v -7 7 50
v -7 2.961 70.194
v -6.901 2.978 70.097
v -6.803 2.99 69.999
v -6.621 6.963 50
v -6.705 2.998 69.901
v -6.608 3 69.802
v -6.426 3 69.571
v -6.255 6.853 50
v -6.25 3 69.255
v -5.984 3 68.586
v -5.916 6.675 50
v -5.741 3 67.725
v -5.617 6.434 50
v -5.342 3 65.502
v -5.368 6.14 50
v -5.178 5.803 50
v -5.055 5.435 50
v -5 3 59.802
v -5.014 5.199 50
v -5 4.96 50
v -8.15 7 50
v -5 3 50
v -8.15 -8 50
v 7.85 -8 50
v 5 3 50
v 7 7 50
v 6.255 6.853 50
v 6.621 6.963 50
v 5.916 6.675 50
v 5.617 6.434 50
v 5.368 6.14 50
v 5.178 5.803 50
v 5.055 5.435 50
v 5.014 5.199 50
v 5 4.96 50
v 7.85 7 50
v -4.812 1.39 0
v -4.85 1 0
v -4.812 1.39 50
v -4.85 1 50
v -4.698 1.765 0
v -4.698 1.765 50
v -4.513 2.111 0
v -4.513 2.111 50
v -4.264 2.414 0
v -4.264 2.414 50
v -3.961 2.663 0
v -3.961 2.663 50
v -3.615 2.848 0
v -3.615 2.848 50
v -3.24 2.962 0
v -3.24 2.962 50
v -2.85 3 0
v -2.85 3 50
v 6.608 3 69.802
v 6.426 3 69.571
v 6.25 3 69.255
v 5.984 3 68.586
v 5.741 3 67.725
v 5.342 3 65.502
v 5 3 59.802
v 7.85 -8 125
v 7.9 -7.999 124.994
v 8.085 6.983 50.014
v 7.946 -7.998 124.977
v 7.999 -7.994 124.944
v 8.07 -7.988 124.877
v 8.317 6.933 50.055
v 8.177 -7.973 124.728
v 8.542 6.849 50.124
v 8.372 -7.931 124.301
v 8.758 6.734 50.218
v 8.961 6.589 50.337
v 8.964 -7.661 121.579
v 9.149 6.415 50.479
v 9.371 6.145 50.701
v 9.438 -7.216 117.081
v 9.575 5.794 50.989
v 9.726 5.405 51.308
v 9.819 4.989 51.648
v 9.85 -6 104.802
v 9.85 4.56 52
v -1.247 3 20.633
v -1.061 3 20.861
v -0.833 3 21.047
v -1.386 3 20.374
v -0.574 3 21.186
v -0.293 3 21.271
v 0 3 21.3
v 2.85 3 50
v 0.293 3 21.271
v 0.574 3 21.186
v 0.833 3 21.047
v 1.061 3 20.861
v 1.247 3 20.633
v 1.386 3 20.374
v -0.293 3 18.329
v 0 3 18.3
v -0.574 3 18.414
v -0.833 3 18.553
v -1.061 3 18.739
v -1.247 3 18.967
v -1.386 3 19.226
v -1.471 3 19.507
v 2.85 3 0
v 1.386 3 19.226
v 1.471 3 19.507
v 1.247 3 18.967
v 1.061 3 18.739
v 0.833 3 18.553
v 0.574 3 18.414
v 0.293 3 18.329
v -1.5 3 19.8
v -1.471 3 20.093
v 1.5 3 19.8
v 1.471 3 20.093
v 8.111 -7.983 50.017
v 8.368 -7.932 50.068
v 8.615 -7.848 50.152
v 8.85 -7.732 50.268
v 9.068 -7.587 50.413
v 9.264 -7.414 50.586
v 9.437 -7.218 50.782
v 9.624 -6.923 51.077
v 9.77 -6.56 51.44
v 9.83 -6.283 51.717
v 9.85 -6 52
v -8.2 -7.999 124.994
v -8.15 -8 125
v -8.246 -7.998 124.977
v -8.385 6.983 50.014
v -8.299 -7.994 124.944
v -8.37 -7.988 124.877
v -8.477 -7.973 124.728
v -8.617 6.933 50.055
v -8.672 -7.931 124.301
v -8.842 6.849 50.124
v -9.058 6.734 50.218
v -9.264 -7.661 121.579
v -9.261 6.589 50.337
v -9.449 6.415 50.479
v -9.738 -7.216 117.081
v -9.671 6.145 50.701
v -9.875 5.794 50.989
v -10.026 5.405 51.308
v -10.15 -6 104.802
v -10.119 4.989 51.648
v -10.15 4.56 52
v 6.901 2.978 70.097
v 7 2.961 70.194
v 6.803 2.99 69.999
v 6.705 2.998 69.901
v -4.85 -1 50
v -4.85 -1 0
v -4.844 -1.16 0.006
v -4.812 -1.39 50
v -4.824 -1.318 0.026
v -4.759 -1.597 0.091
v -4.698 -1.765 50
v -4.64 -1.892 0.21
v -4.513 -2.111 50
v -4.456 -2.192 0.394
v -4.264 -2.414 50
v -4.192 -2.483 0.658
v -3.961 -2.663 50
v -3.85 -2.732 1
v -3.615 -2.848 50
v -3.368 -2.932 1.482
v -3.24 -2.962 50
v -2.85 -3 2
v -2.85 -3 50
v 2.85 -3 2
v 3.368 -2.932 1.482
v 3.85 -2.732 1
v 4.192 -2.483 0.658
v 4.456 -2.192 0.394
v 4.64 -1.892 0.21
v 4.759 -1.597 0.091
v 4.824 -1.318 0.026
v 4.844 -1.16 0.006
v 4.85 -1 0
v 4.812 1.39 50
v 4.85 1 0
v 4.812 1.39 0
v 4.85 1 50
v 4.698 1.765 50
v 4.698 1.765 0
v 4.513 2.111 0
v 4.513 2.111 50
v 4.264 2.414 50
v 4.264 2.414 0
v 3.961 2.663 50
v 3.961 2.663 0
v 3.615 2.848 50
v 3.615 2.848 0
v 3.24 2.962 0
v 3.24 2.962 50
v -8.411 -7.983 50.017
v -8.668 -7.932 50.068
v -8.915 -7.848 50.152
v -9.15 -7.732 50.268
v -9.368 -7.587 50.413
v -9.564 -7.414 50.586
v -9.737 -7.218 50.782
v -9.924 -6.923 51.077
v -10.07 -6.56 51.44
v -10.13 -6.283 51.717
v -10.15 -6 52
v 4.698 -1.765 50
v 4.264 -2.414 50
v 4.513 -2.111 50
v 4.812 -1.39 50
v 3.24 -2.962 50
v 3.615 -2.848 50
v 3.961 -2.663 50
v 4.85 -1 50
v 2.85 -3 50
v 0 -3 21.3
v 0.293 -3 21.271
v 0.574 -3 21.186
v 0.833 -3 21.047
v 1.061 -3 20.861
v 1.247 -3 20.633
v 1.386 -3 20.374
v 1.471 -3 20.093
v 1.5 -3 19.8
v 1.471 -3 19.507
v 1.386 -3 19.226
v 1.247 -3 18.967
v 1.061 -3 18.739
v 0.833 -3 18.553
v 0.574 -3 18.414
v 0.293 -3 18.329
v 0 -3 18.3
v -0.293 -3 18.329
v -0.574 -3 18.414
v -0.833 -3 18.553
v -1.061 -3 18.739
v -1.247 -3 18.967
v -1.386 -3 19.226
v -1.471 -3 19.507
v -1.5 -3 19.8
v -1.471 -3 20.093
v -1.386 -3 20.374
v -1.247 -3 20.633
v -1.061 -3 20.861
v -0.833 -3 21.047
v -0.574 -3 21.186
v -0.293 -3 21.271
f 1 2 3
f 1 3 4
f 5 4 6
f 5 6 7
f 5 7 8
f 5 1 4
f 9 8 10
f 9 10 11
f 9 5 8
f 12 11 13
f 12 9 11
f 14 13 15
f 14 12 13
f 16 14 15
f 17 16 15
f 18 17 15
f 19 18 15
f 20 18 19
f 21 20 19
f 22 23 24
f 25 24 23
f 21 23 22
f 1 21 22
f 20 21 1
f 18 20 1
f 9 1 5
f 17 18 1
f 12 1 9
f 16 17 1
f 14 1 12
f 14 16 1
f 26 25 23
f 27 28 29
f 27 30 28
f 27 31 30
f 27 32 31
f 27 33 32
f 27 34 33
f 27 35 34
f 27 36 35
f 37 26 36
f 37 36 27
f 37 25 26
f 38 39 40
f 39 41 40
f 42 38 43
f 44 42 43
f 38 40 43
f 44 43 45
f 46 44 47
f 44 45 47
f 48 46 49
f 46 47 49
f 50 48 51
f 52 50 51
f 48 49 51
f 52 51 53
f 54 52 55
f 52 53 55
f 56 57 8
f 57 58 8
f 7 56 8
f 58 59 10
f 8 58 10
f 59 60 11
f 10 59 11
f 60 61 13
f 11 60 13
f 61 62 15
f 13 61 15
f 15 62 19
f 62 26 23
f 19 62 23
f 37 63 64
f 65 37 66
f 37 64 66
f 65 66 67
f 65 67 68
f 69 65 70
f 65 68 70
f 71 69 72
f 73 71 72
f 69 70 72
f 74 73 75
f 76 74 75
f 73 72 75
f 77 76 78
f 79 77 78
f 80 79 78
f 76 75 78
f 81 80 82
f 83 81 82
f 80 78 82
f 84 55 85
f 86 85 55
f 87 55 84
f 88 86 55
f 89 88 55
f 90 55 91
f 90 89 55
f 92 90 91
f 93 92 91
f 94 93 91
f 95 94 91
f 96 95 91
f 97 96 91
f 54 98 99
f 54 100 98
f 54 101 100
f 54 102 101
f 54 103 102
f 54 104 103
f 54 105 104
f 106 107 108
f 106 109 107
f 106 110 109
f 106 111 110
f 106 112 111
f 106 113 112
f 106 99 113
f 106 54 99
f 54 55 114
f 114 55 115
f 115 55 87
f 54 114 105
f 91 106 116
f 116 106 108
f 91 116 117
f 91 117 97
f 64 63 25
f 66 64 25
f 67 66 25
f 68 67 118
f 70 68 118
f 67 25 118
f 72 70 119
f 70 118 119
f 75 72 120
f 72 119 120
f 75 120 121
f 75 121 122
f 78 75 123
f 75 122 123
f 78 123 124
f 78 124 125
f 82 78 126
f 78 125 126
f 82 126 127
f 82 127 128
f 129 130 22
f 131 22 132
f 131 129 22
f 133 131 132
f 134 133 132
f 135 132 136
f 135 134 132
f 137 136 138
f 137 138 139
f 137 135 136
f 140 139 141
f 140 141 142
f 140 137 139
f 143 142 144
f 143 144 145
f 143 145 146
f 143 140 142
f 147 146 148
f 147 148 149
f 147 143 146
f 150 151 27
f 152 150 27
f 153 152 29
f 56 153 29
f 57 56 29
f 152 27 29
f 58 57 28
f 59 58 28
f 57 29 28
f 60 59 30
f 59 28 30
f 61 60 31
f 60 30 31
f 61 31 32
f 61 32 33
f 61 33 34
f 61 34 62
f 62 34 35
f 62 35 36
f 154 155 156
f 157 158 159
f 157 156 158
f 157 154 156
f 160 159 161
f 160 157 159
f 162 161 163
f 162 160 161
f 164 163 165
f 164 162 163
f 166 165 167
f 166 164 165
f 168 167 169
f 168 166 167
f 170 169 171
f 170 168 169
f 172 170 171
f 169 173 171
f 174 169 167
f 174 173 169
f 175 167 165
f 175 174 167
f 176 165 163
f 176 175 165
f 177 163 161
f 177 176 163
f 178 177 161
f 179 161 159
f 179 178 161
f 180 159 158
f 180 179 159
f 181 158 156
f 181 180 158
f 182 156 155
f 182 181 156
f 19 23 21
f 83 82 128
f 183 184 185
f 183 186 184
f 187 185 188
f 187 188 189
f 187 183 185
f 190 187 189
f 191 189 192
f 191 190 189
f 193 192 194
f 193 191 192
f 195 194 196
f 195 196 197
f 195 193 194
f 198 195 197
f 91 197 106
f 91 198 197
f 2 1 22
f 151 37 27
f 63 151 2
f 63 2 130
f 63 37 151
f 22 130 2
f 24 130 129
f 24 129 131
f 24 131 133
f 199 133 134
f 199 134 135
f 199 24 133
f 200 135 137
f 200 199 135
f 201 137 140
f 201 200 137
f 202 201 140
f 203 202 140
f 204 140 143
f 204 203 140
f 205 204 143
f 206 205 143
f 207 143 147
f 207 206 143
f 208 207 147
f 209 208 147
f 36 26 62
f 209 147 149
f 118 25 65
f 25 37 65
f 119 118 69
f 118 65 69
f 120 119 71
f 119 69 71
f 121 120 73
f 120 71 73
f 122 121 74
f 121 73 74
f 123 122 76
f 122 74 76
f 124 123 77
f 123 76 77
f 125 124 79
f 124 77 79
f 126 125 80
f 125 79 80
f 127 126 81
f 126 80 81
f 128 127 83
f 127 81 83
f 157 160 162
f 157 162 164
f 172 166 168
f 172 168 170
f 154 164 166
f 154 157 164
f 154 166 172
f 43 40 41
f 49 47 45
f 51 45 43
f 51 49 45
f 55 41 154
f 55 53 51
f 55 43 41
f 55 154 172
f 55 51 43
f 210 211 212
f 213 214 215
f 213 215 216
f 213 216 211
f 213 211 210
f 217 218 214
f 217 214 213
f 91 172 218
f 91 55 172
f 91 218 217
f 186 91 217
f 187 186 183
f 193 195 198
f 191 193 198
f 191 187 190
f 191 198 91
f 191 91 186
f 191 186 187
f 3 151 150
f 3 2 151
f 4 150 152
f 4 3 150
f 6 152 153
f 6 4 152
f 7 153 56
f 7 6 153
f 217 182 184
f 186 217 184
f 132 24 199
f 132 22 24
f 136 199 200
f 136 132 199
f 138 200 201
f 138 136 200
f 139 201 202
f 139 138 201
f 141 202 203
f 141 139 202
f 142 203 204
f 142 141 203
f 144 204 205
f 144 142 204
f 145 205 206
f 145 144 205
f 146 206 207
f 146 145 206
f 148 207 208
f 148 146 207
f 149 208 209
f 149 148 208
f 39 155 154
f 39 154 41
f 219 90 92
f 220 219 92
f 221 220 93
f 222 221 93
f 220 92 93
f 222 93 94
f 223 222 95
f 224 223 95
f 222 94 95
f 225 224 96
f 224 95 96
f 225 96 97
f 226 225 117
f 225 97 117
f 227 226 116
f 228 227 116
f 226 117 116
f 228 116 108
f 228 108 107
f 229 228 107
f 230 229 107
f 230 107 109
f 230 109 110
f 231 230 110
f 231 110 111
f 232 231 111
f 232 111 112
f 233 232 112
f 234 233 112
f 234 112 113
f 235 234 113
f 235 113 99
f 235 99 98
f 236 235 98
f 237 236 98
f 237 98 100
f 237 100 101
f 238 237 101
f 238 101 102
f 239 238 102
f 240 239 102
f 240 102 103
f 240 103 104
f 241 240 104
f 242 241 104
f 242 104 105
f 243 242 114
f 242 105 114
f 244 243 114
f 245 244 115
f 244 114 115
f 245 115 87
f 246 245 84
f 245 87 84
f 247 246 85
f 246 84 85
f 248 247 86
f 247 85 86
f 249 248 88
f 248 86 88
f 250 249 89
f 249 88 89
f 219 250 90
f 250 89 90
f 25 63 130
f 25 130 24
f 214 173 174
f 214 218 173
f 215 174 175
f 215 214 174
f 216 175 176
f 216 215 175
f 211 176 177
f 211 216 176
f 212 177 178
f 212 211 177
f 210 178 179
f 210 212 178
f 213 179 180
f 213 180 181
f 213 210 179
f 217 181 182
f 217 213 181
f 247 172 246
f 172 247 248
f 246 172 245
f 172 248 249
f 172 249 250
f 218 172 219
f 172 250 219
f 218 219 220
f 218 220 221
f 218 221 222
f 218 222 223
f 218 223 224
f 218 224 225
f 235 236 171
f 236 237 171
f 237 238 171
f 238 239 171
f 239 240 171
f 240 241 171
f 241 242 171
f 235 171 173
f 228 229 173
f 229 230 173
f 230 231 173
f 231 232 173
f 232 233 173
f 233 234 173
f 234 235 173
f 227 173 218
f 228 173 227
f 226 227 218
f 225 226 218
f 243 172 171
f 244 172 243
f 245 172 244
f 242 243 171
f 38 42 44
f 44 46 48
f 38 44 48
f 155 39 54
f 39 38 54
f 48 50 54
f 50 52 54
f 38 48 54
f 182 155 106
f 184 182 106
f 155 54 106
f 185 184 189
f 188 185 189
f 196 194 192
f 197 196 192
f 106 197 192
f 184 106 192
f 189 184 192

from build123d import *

# Parameters (mm, degrees)
SKETCH1_W           = 9.7
SKETCH1_H           = 6
BOSS_EXTRUDE3_DEPTH = 50
BOSS_EXTRUDE4_START = 5
BOSS_EXTRUDE4_DEPTH = 20
FILLET1_R           = 2
CUT_EXTRUDE1_REACH  = 127.666
SKETCH6_W           = 10
SKETCH6_H           = 4
FILLET2_R           = 2
SKETCH7_R           = 1.5
CUT_EXTRUDE2_DEPTH  = 7


with BuildPart() as part:
    # Sketch1 → Boss-Extrude3 (new body)
    with BuildSketch(Plane.XY):
        Rectangle(SKETCH1_W, SKETCH1_H)
    extrude(amount=BOSS_EXTRUDE3_DEPTH)

    # Fillet1
    fillet1_edges = [part.edges().sort_by_distance(p)[0] for p in [
        (0, -3, 0),
        (4.85, -3, 25),
        (-4.85, -3, 25),
        (-4.85, 3, 25),
        (4.85, 3, 25),
    ]]
    fillet(fillet1_edges, radius=FILLET1_R)

    # Sketch7 → Cut-Extrude2 (cut)
    with BuildSketch(Plane(origin=(0, 3, 0), x_dir=(1, 0, 0), z_dir=(0, 1, 0))):
        with Locations(Location((0, -19.8, 0), (0, 0, 270))):
            Circle(SKETCH7_R)
    extrude(amount=-CUT_EXTRUDE2_DEPTH, mode=Mode.SUBTRACT)


with BuildPart() as body_2:
    # Sketch3 → Boss-Extrude4 (new body)
    with BuildSketch(Plane(origin=(4.85, 0, 0), x_dir=(0, 0, -1), z_dir=(1, 0, 0)).offset(BOSS_EXTRUDE4_START)):
        Polygon((-125, -8), (-50, -8), (-50, 7), align=None)
    extrude(amount=-BOSS_EXTRUDE4_DEPTH)

    # Cut-Extrude1: up to this face of the body (flat: up to its plane)
    cut_extrude1_end = Plane(body_2.part.faces().sort_by_distance((-0.15, -0.5, 87.5))[0])
    # Sketch6 → Cut-Extrude1 (cut, up to the picked face)
    with BuildSketch(Plane(origin=(0, 0, 0), x_dir=(-1, 0, 0), z_dir=(0, 0, -1)), mode=Mode.PRIVATE) as cut_extrude1_sk1:
        with Locations((0, 5)):
            Rectangle(SKETCH6_W, SKETCH6_H)
    cut_extrude1_tool1 = split(extrude(cut_extrude1_sk1.sketch, amount=-CUT_EXTRUDE1_REACH, mode=Mode.PRIVATE), bisect_by=cut_extrude1_end, keep=Keep.BOTH, mode=Mode.PRIVATE)
    add(cut_extrude1_tool1.solids().sort_by(Axis((0, 5, 0), (0, 0, 1)))[0], mode=Mode.SUBTRACT)

    # Fillet2
    fillet2_edges = [body_2.edges().sort_by_distance(p)[0] for p in [
        (-10.15, -0.5, 50),
        (5, 5, 60),
        (0, 3, 70),
        (-5, 5, 60),
        (9.85, -0.5, 50),
        (9.85, -8, 87.5),
        (9.85, -0.5, 87.5),
        (-10.15, -0.5, 87.5),
        (-10.15, -8, 87.5),
    ]]
    fillet(fillet2_edges, radius=FILLET2_R)


solid = Compound([part.part, body_2.part])
